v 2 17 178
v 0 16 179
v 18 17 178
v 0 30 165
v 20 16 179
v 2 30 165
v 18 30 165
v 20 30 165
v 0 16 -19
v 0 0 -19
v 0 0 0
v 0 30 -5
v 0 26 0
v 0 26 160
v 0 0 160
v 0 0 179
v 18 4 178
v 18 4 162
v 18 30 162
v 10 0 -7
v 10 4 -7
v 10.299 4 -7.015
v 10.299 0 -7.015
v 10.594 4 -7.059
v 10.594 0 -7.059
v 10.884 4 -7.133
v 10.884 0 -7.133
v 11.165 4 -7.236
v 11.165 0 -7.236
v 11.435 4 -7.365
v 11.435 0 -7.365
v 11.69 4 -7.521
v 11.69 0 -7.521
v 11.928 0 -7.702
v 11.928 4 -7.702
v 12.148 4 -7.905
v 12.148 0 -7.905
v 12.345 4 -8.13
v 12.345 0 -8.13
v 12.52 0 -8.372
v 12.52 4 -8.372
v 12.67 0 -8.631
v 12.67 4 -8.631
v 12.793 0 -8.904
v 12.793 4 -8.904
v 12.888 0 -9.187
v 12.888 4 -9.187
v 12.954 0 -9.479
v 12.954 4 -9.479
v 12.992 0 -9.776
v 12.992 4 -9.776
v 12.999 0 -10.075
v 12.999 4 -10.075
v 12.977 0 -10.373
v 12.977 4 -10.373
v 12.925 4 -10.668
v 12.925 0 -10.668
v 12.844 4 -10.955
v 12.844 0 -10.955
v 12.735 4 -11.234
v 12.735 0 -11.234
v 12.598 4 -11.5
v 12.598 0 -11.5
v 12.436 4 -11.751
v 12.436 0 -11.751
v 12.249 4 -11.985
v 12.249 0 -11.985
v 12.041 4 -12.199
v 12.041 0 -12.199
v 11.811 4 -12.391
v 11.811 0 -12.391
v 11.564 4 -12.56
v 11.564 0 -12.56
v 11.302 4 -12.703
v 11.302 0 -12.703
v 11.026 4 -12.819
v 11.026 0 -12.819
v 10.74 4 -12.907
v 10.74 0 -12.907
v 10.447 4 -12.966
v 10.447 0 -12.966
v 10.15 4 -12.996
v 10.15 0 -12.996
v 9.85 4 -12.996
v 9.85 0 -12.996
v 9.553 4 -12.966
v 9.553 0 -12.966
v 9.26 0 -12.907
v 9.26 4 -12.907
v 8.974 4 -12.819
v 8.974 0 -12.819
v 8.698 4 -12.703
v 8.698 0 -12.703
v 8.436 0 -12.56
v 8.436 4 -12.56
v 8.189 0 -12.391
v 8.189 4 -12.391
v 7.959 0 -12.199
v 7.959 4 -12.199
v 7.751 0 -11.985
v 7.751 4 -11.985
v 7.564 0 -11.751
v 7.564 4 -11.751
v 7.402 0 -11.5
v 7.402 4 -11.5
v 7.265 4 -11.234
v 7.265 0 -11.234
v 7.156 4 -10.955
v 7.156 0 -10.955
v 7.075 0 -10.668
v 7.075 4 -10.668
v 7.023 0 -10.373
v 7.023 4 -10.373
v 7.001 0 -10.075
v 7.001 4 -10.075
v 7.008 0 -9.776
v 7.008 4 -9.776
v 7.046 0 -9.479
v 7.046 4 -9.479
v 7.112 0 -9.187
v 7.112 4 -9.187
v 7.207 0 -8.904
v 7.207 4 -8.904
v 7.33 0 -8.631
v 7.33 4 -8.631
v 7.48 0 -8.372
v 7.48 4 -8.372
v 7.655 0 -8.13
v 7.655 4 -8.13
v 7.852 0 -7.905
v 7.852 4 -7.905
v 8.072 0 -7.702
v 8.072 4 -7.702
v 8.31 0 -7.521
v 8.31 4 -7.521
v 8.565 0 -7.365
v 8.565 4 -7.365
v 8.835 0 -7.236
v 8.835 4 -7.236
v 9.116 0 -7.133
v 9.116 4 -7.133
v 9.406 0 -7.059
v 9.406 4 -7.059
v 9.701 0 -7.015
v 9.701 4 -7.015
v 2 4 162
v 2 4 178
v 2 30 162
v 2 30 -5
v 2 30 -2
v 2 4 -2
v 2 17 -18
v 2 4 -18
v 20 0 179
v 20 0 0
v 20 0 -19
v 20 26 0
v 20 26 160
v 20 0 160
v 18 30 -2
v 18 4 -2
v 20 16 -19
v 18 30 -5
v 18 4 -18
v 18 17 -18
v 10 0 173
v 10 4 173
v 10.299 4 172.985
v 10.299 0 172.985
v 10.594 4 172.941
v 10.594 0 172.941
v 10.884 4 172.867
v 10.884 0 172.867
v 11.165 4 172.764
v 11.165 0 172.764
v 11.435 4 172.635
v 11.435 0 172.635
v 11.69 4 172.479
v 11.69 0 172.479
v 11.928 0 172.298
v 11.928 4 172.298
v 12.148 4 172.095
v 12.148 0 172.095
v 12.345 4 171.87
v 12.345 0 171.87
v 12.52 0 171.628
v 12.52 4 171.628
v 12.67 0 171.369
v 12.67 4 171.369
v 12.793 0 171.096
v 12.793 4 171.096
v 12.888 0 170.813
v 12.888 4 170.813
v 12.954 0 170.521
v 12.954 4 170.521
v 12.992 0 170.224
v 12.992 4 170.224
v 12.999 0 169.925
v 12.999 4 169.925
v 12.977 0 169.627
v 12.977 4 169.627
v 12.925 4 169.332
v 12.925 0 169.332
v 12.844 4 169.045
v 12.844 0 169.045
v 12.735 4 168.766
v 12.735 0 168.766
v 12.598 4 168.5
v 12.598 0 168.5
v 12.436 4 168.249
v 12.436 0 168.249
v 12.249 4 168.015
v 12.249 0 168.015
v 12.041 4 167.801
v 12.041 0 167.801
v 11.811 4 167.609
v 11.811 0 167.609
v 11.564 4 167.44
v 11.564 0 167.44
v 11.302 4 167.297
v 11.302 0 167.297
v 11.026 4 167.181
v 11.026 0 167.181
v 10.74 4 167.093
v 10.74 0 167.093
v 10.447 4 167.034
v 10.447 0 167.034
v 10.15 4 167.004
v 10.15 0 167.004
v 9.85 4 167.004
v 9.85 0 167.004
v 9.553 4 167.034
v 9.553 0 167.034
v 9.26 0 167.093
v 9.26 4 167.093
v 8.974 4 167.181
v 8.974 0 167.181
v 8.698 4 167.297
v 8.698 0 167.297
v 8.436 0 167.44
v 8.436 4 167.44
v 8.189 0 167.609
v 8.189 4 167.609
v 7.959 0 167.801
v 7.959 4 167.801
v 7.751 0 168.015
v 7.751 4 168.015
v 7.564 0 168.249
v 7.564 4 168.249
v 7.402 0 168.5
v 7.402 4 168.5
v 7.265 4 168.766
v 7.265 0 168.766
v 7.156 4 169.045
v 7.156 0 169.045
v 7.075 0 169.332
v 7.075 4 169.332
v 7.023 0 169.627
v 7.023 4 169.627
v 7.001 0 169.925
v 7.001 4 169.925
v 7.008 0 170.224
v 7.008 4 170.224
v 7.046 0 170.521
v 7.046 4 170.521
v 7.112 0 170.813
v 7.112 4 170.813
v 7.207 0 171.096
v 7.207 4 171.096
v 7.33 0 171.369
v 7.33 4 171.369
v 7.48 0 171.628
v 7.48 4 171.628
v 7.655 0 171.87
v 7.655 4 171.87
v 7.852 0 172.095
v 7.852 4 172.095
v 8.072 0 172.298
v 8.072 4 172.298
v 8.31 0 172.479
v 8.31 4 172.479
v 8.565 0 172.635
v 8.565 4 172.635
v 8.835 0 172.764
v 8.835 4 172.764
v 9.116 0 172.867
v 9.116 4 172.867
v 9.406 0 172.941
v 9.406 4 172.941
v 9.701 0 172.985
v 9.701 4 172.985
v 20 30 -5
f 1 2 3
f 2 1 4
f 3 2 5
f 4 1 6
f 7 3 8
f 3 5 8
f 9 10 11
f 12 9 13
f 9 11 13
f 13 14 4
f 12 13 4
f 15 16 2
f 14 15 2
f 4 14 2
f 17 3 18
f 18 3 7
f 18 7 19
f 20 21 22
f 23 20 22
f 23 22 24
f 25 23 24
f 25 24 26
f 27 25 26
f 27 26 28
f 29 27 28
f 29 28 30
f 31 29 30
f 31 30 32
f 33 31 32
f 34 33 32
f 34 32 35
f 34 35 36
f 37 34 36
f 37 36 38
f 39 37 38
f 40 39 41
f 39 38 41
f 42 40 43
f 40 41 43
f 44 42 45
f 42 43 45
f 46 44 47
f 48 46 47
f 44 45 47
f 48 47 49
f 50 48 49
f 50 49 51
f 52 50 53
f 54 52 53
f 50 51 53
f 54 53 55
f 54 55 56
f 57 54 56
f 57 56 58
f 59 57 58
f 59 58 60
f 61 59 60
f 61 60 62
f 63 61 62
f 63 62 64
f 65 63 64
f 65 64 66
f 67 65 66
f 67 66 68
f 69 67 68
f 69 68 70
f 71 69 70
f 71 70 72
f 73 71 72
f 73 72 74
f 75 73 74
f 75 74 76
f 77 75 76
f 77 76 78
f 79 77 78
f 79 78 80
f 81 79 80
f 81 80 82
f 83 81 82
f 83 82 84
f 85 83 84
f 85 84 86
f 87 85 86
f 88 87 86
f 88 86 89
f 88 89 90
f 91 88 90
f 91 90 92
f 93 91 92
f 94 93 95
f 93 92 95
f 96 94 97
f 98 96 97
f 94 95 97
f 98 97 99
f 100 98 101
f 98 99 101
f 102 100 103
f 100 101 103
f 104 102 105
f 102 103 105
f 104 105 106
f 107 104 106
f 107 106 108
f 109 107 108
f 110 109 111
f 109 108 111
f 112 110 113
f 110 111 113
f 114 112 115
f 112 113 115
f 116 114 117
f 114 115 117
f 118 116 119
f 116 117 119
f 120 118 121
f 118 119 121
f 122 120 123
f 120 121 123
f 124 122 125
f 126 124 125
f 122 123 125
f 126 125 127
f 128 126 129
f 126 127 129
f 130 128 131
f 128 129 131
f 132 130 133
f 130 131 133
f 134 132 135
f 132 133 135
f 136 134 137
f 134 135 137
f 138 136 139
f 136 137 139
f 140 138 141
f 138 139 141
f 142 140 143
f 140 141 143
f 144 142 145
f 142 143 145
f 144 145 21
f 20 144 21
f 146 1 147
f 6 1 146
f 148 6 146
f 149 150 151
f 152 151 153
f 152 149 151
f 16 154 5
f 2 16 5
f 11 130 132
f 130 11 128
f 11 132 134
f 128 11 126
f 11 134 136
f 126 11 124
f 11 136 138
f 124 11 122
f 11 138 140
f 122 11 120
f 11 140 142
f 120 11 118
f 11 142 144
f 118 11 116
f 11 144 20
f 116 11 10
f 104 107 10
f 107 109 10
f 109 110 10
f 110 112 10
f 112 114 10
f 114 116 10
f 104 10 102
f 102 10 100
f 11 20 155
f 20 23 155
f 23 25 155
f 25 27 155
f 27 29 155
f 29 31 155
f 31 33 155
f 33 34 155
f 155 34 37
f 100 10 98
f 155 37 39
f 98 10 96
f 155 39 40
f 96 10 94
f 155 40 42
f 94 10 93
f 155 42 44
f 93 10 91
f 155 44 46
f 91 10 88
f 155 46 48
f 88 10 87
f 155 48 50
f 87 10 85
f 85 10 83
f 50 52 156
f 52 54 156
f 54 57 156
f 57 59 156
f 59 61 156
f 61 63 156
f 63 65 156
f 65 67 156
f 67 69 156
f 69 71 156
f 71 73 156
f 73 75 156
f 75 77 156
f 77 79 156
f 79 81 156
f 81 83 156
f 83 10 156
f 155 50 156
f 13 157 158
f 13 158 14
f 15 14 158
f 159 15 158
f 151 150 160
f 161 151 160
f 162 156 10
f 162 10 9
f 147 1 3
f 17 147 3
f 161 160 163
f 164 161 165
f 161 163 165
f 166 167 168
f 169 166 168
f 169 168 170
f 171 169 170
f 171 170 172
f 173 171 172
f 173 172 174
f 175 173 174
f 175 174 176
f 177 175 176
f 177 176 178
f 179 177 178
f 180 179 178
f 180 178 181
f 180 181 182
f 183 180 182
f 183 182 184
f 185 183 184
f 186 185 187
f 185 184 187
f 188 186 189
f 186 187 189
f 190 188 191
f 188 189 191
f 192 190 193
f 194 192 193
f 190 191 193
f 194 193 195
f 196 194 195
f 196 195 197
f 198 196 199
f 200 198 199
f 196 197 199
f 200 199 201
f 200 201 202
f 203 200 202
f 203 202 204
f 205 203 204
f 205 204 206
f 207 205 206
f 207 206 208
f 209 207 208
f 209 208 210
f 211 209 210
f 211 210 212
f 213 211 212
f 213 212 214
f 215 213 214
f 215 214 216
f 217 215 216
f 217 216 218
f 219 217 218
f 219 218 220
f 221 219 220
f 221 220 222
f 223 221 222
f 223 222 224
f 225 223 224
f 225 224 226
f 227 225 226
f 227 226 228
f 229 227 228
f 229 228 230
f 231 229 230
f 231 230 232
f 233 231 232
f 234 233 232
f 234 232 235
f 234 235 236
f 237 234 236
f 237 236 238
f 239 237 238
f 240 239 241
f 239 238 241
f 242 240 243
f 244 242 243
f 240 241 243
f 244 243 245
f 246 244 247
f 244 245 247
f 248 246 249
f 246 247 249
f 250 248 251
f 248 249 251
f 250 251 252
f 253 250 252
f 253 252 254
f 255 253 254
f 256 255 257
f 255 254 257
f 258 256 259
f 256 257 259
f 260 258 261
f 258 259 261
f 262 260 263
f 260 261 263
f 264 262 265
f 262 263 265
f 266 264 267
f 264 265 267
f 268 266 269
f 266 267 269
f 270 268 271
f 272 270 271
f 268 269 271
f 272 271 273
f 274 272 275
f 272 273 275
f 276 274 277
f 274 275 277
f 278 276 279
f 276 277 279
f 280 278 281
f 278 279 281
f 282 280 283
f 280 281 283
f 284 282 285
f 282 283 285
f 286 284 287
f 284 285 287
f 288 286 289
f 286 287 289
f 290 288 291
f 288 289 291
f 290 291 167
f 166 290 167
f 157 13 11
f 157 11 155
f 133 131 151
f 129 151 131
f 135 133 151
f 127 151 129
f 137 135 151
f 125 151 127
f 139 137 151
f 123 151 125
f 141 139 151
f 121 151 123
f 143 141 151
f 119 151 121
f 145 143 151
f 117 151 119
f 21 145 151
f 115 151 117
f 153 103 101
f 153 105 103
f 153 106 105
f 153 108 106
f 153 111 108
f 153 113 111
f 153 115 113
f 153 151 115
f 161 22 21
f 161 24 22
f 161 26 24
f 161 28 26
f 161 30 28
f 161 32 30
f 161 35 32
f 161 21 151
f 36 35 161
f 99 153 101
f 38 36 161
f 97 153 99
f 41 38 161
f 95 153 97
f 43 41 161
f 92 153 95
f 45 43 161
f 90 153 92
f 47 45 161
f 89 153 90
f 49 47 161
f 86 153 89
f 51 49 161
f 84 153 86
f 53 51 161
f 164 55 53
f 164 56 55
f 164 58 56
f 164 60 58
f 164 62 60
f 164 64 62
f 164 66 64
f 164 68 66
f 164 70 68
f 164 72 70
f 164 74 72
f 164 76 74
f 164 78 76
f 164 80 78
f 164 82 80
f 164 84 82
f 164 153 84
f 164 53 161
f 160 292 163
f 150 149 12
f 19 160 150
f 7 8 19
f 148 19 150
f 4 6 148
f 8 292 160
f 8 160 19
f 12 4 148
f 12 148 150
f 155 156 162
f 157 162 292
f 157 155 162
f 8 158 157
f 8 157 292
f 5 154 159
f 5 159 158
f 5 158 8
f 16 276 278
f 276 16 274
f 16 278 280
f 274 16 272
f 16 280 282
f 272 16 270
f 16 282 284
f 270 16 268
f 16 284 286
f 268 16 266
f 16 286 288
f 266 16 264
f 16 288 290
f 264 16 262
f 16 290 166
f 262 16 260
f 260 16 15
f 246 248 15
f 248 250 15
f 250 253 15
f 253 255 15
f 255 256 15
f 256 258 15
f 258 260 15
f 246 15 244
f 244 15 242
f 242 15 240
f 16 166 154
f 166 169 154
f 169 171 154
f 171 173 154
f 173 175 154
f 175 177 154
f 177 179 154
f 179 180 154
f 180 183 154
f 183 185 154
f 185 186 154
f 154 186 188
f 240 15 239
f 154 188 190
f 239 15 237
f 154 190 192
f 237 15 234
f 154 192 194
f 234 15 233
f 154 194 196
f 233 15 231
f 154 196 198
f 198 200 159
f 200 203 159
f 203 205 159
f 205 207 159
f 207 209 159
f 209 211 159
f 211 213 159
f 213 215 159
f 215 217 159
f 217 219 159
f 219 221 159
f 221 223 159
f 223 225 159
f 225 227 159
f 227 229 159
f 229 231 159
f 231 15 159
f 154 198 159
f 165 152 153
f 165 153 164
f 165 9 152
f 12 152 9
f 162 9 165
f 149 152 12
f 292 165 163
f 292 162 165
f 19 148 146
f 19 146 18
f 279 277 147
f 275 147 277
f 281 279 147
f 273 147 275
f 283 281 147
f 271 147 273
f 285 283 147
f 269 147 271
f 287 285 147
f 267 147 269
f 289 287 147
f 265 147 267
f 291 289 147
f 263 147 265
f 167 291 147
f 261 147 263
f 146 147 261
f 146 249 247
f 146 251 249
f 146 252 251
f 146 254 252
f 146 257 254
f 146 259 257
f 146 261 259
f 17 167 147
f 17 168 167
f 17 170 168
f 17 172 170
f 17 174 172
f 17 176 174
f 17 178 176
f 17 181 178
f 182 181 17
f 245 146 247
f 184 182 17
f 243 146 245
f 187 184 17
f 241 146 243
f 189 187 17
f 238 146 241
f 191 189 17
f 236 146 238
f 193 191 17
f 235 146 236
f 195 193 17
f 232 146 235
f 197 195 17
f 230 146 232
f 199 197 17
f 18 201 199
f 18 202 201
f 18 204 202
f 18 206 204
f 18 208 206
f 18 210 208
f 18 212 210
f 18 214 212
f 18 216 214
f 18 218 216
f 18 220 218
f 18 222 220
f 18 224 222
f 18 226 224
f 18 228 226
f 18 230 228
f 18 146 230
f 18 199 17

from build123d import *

# Parameters (mm, degrees)
SKETCH2_W             = 20
SKETCH2_H             = 20
BOSS_EXTRUDE1_DEPTH   = 30
BOSS_EXTRUDE1_2_DEPTH = 30
SKETCH3_W             = 16
SKETCH3_H             = 16
CUT_EXTRUDE1_DEPTH    = 26
SKETCH4_R             = 3
CUT_EXTRUDE2_DEPTH    = 56
SKETCH7_W             = 20
SKETCH7_H             = 4
BOSS_EXTRUDE2_DEPTH   = 160
CUT_EXTRUDE5_DEPTH    = 140
SKETCH10_W            = 1
SKETCH10_H            = 37.358544319
CUT_EXTRUDE6_DEPTH    = 140


with BuildPart() as part:
    # Sketch2 → Boss-Extrude1 (new body)
    with BuildSketch(Plane(origin=(0, 0, 0), x_dir=(1, 0, 0), z_dir=(0, 1, 0))):
        with Locations((10, 10)):
            Rectangle(SKETCH2_W, SKETCH2_H)
    extrude(amount=BOSS_EXTRUDE1_DEPTH)


with BuildPart() as body_2:
    # Sketch2 → Boss-Extrude1 2 (new body)
    with BuildSketch(Plane(origin=(0, 0, 0), x_dir=(1, 0, 0), z_dir=(0, 1, 0))):
        with Locations((10, -170)):
            Rectangle(SKETCH2_W, SKETCH2_H)
    extrude(amount=BOSS_EXTRUDE1_2_DEPTH)


with BuildPart() as cut_extrude1_tool:
    # Sketch3 → Cut-Extrude1 (new body)
    with BuildSketch(Plane(origin=(0, 30, 0), x_dir=(1, 0, 0), z_dir=(0, 1, 0))):
        with Locations((10, 10)):
            Rectangle(SKETCH3_W, SKETCH3_H)
        with Locations((10, -170)):
            Rectangle(SKETCH3_W, SKETCH3_H)
    extrude(amount=-CUT_EXTRUDE1_DEPTH)


with BuildPart() as part_1:
    add(part.part)

    # Cut-Extrude1: cut by cut_extrude1_tool
    add(cut_extrude1_tool.part, mode=Mode.SUBTRACT)


with BuildPart() as body_2_1:
    add(body_2.part)

    # Cut-Extrude1: cut by cut_extrude1_tool
    add(cut_extrude1_tool.part, mode=Mode.SUBTRACT)


with BuildPart() as cut_extrude2_tool:
    # Sketch4 → Cut-Extrude2 (new body)
    with BuildSketch(Plane(origin=(0, 4, 0), x_dir=(1, 0, 0), z_dir=(0, 1, 0))):
        with Locations(Location((10, -170, 0), (0, 0, 270))):
            Circle(SKETCH4_R)
        with Locations(Location((10, 10, 0), (0, 0, 270))):
            Circle(SKETCH4_R)
    extrude(amount=-CUT_EXTRUDE2_DEPTH)


with BuildPart() as part_2:
    add(part_1.part)

    # Cut-Extrude2: cut by cut_extrude2_tool
    add(cut_extrude2_tool.part, mode=Mode.SUBTRACT)



with BuildPart() as body_2_2:
    add(body_2_1.part)

    # Cut-Extrude2: cut by cut_extrude2_tool
    add(cut_extrude2_tool.part, mode=Mode.SUBTRACT)


with BuildPart() as part_3:
    add(part_2.part)

    add(body_2_2.part)  # Boss-Extrude2 merges body 2
    # Sketch7 → Boss-Extrude2 (add)
    with BuildSketch(Plane(origin=(0, 0, 160), x_dir=(-1, 0, 0), z_dir=(0, 0, -1))):
        with Locations((-10, 28)):
            Rectangle(SKETCH7_W, SKETCH7_H)
    extrude(amount=BOSS_EXTRUDE2_DEPTH)

    # Sketch9 → Cut-Extrude5 (cut)
    with BuildSketch(Plane(origin=(20, 0, 0), x_dir=(0, 0, -1), z_dir=(1, 0, 0))):
        Polygon((-180, 15), (-165, 30), (-180, 30), align=None)
        Polygon((20, 15), (5, 30), (20, 30), align=None)
    extrude(amount=-CUT_EXTRUDE5_DEPTH, mode=Mode.SUBTRACT)

    # Sketch10 → Cut-Extrude6 (cut)
    with BuildSketch(Plane(origin=(20, 0, 0), x_dir=(0, 0, -1), z_dir=(1, 0, 0))):
        with Locations((-179.5, 18.67927216)):
            Rectangle(SKETCH10_W, SKETCH10_H)
        with Locations((19.5, 18.67927216)):
            Rectangle(SKETCH10_W, SKETCH10_H)
    extrude(amount=-CUT_EXTRUDE6_DEPTH, mode=Mode.SUBTRACT)


solid = part_3.part
